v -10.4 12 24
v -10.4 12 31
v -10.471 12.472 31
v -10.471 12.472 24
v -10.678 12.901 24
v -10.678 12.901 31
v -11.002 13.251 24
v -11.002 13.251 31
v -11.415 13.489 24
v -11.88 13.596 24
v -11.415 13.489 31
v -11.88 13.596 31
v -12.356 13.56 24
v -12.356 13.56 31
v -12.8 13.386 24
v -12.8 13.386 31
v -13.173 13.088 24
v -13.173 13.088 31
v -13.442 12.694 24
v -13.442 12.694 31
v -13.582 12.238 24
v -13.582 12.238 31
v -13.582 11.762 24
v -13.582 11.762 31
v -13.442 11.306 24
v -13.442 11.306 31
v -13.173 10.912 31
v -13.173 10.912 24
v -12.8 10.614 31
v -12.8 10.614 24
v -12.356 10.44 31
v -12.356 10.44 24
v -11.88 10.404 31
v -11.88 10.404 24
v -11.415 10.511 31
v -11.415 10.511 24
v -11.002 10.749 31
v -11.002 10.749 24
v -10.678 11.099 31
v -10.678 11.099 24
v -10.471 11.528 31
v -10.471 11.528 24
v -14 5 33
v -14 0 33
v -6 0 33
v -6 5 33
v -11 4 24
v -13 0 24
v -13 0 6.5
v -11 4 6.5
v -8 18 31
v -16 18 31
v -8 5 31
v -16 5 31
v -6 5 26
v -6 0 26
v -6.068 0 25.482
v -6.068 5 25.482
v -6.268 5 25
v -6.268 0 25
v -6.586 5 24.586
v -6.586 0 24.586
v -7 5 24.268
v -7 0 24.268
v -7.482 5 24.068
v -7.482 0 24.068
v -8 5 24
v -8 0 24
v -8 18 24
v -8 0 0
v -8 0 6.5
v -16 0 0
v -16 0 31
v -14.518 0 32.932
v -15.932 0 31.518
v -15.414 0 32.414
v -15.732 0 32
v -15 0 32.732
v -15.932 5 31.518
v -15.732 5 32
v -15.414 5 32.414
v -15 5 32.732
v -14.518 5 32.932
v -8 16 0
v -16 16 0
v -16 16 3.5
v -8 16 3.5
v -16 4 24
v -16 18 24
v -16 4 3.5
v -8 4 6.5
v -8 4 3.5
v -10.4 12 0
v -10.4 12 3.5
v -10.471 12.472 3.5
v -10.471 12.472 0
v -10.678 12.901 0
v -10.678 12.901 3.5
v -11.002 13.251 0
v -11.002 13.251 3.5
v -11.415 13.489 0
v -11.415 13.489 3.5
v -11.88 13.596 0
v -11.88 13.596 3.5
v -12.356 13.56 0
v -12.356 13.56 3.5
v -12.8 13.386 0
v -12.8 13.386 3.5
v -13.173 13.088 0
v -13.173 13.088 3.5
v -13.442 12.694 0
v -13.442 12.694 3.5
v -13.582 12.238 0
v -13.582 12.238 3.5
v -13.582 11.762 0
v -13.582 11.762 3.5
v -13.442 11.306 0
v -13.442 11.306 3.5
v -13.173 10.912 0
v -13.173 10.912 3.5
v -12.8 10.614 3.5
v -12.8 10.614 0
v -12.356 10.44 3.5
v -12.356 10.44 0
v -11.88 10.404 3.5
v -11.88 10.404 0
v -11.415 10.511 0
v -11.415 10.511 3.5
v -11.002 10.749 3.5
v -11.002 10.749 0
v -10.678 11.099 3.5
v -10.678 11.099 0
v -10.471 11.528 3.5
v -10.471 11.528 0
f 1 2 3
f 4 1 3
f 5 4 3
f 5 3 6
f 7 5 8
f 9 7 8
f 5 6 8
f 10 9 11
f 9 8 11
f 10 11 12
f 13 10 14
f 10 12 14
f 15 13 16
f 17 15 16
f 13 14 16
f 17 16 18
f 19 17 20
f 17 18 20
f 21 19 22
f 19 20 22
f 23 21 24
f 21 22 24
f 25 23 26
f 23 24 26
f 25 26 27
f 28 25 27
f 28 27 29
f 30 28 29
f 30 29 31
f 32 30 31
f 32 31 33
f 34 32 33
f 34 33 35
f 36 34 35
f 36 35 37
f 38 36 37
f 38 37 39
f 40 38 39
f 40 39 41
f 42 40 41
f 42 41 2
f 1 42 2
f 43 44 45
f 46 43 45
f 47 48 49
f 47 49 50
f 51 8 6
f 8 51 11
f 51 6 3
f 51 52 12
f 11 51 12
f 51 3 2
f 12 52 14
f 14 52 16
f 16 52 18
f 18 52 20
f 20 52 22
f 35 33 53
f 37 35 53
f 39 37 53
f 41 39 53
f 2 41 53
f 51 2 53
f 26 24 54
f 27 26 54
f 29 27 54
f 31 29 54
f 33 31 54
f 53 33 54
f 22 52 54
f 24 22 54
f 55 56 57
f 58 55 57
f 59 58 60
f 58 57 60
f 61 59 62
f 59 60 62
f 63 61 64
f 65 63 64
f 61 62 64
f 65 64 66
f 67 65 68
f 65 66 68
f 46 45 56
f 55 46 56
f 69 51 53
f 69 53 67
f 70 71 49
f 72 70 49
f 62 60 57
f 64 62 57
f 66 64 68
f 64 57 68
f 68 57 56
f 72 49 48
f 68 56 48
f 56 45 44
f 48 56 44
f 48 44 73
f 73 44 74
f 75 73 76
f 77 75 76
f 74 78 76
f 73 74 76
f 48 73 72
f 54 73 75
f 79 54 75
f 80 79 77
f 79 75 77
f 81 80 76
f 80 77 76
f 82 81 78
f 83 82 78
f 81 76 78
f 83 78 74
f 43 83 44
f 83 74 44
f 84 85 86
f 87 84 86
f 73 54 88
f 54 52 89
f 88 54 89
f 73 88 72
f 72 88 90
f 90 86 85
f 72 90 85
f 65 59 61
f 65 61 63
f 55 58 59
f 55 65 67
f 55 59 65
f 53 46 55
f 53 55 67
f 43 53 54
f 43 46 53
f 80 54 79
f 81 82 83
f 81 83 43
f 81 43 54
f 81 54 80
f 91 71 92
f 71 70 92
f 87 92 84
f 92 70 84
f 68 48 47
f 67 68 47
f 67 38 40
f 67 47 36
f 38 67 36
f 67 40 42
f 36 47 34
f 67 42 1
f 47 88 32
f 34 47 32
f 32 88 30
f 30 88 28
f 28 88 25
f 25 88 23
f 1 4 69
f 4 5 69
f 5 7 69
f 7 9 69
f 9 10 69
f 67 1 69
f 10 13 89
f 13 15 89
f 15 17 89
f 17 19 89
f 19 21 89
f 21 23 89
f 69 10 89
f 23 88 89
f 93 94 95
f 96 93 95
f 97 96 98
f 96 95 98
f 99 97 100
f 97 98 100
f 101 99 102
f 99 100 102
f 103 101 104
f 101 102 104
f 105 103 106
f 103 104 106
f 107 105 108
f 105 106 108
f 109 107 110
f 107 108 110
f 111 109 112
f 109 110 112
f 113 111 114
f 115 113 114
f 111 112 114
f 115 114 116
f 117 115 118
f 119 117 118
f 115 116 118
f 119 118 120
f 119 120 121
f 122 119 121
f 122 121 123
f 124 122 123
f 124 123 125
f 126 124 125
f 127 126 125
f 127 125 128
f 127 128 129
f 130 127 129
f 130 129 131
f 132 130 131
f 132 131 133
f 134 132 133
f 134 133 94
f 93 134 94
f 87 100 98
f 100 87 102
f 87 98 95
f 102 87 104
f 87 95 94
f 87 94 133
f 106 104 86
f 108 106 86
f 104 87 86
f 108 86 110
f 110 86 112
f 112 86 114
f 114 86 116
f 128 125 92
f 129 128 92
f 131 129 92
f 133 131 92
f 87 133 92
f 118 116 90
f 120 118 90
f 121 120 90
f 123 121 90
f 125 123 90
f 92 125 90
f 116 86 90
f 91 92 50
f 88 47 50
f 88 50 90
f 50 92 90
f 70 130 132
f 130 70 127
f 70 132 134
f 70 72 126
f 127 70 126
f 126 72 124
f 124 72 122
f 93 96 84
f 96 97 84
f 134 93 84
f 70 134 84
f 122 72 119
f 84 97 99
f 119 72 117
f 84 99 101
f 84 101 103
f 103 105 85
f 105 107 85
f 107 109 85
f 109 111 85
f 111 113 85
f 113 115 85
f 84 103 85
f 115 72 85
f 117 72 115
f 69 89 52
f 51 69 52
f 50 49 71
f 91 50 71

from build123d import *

# Parameters (mm, degrees)
BOSS_EXTRUDE1_DEPTH = 8
CUT_EXTRUDE2_DEPTH  = 20.5
SKETCH6_W           = 35.270415117
SKETCH6_H           = 22.226622545
CUT_EXTRUDE3_DEPTH  = 8
BOSS_EXTRUDE2_DEPTH = 3
BOSS_EXTRUDE7_DEPTH = 5
SKETCH7_R           = 1.6
CUT_EXTRUDE6_DEPTH  = 40.255572853


with BuildPart() as part:
    # Sketch1 → Boss-Extrude1 (new body)
    with BuildSketch(Plane(origin=(0, 0, 0), x_dir=(0, 0, -1), z_dir=(1, 0, 0))):
        Polygon((0, 0), (0, 16), (-3.5, 16), (-3.5, 4), (-24, 4), (-24, 18), (-31, 18), (-31, 0), align=None)
    boss_extrude1 = extrude(amount=-BOSS_EXTRUDE1_DEPTH)

    # Sketch5 → Cut-Extrude2 (cut)
    with BuildSketch(Plane.XY.offset(3.5)):
        Polygon((-8, 0), (-3, 0), (-5, 4), (-8, 4), align=None)
    cut_extrude2 = extrude(amount=CUT_EXTRUDE2_DEPTH, mode=Mode.SUBTRACT)

    # Mirror1: Boss-Extrude1, Cut-Extrude2 across plane
    add(boss_extrude1.mirror(Plane(origin=(-8, 0, 0), x_dir=(0, 0, 1), z_dir=(1, 0, 0))))
    add(cut_extrude2.mirror(Plane(origin=(-8, 0, 0), x_dir=(0, 0, 1), z_dir=(1, 0, 0))), mode=Mode.SUBTRACT)

    # Sketch6 → Cut-Extrude3 (cut)
    with BuildSketch(Plane(origin=(0, 0, 0), x_dir=(0, 0, -1), z_dir=(1, 0, 0))):
        with Locations((-16.260875851, 8.713036563)):
            Rectangle(SKETCH6_W, SKETCH6_H)
    extrude(amount=-CUT_EXTRUDE3_DEPTH, mode=Mode.SUBTRACT)

    # Sketch9 → Boss-Extrude2 (add)
    with BuildSketch(Plane.XY.offset(3.5)):
        Polygon((-11, 4), (-13, 0), (-8, 0), (-8, 4), align=None)
    extrude(amount=BOSS_EXTRUDE2_DEPTH)

    # Sketch13 → Boss-Extrude7 (add)
    with BuildSketch(Plane.XZ):
        with BuildLine():
            Line((-14, 33), (-6, 33))
            Line((-6, 33), (-6, 26))
            ThreePointArc((-6, 26), (-6.585786438, 24.585786438), (-8, 24))
            Line((-8, 24), (-8, 31))
            Line((-8, 31), (-16, 31))
            ThreePointArc((-16, 31), (-15.414213562, 32.414213562), (-14, 33))
        make_face()
    extrude(amount=-BOSS_EXTRUDE7_DEPTH)

    # Sketch7 → Cut-Extrude6 (cut, through all)
    with BuildSketch(Plane.XY.offset(31)):
        with Locations((-12, 12)):
            Circle(SKETCH7_R)
    extrude(amount=-CUT_EXTRUDE6_DEPTH, mode=Mode.SUBTRACT)


solid = part.part
